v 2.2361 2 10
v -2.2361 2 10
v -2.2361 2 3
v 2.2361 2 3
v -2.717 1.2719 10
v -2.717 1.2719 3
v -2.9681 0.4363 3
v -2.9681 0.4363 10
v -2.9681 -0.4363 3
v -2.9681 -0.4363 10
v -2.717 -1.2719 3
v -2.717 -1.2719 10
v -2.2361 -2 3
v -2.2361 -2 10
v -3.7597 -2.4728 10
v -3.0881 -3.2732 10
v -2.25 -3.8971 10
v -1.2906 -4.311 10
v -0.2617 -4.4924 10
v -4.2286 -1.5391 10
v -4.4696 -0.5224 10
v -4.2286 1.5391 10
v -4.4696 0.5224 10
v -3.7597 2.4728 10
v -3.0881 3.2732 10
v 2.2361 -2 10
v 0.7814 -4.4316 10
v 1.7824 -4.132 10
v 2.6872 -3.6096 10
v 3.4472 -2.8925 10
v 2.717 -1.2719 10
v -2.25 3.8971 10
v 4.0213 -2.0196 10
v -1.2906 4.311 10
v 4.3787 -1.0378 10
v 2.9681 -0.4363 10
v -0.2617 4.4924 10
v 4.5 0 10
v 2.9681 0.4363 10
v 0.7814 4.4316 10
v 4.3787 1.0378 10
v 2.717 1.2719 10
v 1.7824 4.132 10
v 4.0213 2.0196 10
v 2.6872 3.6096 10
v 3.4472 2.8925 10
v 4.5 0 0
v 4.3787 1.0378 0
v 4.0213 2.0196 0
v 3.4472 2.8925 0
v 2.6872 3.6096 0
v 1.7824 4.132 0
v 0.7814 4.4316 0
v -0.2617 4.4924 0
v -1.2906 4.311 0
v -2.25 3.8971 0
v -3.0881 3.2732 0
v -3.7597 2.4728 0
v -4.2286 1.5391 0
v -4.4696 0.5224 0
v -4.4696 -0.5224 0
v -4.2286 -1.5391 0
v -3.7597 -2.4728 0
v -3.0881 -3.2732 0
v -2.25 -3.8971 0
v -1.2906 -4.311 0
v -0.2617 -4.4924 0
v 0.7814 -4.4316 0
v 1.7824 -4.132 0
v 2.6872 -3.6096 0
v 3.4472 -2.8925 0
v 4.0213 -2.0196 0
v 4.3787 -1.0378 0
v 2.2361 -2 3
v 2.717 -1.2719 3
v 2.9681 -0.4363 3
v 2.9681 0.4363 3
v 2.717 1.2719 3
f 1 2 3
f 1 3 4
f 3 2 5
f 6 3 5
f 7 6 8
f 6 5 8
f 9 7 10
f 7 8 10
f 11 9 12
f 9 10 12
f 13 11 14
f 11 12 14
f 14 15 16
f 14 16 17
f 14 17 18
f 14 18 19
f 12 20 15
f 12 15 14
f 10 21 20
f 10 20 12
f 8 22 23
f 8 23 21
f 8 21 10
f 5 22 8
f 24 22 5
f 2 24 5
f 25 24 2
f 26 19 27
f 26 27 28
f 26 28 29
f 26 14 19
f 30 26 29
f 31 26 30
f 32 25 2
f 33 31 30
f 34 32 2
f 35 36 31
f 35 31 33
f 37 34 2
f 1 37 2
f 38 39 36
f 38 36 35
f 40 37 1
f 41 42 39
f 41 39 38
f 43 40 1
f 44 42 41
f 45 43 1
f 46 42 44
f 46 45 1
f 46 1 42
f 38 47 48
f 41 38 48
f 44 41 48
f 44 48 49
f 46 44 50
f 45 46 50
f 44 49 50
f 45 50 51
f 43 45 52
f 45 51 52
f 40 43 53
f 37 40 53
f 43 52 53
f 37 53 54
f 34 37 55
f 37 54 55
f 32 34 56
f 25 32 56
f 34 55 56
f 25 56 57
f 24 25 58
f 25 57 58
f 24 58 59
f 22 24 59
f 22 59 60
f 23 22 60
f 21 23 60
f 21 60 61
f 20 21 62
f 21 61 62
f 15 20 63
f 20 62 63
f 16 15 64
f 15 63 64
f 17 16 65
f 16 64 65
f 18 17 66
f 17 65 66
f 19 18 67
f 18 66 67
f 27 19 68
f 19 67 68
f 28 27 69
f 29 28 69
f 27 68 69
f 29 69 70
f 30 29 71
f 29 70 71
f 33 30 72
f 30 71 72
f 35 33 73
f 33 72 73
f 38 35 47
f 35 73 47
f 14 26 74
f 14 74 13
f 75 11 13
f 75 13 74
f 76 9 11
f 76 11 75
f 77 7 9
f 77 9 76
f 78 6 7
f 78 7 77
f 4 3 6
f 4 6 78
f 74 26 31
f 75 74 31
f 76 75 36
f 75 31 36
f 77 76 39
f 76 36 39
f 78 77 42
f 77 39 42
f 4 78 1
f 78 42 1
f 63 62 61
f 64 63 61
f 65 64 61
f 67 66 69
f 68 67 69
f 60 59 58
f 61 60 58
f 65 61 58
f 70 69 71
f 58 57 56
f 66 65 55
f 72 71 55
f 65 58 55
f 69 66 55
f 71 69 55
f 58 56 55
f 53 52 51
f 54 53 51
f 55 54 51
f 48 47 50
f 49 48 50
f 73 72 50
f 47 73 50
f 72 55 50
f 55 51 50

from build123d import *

# Parameters (mm, degrees)
EXTRUDE001_DEPTH = 7
CYLINDER_R       = 4.5
CYLINDER_DEPTH   = 10


with BuildPart() as extrude001:
    # Sketch002 (on Face3 of Cylinder) → Extrude001 (new body)
    with BuildSketch(Plane.XY.offset(10)):
        with BuildLine():
            ThreePointArc((2.236068, -2), (3, 0), (2.236068, 2))
            Line((-2.236068, 2), (2.236068, 2))
            ThreePointArc((-2.236068, 2), (-3, 0), (-2.236068, -2))
            Line((2.236068, -2), (-2.236068, -2))
        make_face()
    extrude(amount=-EXTRUDE001_DEPTH)


with BuildPart() as cut_for_support:
    # Cylinder → Cylinder (new body)
    with BuildSketch(Plane.XY):
        Circle(CYLINDER_R)
    extrude(amount=CYLINDER_DEPTH)

    # Cut001: cut Extrude001
    add(extrude001.part, mode=Mode.SUBTRACT)


solid = cut_for_support.part
